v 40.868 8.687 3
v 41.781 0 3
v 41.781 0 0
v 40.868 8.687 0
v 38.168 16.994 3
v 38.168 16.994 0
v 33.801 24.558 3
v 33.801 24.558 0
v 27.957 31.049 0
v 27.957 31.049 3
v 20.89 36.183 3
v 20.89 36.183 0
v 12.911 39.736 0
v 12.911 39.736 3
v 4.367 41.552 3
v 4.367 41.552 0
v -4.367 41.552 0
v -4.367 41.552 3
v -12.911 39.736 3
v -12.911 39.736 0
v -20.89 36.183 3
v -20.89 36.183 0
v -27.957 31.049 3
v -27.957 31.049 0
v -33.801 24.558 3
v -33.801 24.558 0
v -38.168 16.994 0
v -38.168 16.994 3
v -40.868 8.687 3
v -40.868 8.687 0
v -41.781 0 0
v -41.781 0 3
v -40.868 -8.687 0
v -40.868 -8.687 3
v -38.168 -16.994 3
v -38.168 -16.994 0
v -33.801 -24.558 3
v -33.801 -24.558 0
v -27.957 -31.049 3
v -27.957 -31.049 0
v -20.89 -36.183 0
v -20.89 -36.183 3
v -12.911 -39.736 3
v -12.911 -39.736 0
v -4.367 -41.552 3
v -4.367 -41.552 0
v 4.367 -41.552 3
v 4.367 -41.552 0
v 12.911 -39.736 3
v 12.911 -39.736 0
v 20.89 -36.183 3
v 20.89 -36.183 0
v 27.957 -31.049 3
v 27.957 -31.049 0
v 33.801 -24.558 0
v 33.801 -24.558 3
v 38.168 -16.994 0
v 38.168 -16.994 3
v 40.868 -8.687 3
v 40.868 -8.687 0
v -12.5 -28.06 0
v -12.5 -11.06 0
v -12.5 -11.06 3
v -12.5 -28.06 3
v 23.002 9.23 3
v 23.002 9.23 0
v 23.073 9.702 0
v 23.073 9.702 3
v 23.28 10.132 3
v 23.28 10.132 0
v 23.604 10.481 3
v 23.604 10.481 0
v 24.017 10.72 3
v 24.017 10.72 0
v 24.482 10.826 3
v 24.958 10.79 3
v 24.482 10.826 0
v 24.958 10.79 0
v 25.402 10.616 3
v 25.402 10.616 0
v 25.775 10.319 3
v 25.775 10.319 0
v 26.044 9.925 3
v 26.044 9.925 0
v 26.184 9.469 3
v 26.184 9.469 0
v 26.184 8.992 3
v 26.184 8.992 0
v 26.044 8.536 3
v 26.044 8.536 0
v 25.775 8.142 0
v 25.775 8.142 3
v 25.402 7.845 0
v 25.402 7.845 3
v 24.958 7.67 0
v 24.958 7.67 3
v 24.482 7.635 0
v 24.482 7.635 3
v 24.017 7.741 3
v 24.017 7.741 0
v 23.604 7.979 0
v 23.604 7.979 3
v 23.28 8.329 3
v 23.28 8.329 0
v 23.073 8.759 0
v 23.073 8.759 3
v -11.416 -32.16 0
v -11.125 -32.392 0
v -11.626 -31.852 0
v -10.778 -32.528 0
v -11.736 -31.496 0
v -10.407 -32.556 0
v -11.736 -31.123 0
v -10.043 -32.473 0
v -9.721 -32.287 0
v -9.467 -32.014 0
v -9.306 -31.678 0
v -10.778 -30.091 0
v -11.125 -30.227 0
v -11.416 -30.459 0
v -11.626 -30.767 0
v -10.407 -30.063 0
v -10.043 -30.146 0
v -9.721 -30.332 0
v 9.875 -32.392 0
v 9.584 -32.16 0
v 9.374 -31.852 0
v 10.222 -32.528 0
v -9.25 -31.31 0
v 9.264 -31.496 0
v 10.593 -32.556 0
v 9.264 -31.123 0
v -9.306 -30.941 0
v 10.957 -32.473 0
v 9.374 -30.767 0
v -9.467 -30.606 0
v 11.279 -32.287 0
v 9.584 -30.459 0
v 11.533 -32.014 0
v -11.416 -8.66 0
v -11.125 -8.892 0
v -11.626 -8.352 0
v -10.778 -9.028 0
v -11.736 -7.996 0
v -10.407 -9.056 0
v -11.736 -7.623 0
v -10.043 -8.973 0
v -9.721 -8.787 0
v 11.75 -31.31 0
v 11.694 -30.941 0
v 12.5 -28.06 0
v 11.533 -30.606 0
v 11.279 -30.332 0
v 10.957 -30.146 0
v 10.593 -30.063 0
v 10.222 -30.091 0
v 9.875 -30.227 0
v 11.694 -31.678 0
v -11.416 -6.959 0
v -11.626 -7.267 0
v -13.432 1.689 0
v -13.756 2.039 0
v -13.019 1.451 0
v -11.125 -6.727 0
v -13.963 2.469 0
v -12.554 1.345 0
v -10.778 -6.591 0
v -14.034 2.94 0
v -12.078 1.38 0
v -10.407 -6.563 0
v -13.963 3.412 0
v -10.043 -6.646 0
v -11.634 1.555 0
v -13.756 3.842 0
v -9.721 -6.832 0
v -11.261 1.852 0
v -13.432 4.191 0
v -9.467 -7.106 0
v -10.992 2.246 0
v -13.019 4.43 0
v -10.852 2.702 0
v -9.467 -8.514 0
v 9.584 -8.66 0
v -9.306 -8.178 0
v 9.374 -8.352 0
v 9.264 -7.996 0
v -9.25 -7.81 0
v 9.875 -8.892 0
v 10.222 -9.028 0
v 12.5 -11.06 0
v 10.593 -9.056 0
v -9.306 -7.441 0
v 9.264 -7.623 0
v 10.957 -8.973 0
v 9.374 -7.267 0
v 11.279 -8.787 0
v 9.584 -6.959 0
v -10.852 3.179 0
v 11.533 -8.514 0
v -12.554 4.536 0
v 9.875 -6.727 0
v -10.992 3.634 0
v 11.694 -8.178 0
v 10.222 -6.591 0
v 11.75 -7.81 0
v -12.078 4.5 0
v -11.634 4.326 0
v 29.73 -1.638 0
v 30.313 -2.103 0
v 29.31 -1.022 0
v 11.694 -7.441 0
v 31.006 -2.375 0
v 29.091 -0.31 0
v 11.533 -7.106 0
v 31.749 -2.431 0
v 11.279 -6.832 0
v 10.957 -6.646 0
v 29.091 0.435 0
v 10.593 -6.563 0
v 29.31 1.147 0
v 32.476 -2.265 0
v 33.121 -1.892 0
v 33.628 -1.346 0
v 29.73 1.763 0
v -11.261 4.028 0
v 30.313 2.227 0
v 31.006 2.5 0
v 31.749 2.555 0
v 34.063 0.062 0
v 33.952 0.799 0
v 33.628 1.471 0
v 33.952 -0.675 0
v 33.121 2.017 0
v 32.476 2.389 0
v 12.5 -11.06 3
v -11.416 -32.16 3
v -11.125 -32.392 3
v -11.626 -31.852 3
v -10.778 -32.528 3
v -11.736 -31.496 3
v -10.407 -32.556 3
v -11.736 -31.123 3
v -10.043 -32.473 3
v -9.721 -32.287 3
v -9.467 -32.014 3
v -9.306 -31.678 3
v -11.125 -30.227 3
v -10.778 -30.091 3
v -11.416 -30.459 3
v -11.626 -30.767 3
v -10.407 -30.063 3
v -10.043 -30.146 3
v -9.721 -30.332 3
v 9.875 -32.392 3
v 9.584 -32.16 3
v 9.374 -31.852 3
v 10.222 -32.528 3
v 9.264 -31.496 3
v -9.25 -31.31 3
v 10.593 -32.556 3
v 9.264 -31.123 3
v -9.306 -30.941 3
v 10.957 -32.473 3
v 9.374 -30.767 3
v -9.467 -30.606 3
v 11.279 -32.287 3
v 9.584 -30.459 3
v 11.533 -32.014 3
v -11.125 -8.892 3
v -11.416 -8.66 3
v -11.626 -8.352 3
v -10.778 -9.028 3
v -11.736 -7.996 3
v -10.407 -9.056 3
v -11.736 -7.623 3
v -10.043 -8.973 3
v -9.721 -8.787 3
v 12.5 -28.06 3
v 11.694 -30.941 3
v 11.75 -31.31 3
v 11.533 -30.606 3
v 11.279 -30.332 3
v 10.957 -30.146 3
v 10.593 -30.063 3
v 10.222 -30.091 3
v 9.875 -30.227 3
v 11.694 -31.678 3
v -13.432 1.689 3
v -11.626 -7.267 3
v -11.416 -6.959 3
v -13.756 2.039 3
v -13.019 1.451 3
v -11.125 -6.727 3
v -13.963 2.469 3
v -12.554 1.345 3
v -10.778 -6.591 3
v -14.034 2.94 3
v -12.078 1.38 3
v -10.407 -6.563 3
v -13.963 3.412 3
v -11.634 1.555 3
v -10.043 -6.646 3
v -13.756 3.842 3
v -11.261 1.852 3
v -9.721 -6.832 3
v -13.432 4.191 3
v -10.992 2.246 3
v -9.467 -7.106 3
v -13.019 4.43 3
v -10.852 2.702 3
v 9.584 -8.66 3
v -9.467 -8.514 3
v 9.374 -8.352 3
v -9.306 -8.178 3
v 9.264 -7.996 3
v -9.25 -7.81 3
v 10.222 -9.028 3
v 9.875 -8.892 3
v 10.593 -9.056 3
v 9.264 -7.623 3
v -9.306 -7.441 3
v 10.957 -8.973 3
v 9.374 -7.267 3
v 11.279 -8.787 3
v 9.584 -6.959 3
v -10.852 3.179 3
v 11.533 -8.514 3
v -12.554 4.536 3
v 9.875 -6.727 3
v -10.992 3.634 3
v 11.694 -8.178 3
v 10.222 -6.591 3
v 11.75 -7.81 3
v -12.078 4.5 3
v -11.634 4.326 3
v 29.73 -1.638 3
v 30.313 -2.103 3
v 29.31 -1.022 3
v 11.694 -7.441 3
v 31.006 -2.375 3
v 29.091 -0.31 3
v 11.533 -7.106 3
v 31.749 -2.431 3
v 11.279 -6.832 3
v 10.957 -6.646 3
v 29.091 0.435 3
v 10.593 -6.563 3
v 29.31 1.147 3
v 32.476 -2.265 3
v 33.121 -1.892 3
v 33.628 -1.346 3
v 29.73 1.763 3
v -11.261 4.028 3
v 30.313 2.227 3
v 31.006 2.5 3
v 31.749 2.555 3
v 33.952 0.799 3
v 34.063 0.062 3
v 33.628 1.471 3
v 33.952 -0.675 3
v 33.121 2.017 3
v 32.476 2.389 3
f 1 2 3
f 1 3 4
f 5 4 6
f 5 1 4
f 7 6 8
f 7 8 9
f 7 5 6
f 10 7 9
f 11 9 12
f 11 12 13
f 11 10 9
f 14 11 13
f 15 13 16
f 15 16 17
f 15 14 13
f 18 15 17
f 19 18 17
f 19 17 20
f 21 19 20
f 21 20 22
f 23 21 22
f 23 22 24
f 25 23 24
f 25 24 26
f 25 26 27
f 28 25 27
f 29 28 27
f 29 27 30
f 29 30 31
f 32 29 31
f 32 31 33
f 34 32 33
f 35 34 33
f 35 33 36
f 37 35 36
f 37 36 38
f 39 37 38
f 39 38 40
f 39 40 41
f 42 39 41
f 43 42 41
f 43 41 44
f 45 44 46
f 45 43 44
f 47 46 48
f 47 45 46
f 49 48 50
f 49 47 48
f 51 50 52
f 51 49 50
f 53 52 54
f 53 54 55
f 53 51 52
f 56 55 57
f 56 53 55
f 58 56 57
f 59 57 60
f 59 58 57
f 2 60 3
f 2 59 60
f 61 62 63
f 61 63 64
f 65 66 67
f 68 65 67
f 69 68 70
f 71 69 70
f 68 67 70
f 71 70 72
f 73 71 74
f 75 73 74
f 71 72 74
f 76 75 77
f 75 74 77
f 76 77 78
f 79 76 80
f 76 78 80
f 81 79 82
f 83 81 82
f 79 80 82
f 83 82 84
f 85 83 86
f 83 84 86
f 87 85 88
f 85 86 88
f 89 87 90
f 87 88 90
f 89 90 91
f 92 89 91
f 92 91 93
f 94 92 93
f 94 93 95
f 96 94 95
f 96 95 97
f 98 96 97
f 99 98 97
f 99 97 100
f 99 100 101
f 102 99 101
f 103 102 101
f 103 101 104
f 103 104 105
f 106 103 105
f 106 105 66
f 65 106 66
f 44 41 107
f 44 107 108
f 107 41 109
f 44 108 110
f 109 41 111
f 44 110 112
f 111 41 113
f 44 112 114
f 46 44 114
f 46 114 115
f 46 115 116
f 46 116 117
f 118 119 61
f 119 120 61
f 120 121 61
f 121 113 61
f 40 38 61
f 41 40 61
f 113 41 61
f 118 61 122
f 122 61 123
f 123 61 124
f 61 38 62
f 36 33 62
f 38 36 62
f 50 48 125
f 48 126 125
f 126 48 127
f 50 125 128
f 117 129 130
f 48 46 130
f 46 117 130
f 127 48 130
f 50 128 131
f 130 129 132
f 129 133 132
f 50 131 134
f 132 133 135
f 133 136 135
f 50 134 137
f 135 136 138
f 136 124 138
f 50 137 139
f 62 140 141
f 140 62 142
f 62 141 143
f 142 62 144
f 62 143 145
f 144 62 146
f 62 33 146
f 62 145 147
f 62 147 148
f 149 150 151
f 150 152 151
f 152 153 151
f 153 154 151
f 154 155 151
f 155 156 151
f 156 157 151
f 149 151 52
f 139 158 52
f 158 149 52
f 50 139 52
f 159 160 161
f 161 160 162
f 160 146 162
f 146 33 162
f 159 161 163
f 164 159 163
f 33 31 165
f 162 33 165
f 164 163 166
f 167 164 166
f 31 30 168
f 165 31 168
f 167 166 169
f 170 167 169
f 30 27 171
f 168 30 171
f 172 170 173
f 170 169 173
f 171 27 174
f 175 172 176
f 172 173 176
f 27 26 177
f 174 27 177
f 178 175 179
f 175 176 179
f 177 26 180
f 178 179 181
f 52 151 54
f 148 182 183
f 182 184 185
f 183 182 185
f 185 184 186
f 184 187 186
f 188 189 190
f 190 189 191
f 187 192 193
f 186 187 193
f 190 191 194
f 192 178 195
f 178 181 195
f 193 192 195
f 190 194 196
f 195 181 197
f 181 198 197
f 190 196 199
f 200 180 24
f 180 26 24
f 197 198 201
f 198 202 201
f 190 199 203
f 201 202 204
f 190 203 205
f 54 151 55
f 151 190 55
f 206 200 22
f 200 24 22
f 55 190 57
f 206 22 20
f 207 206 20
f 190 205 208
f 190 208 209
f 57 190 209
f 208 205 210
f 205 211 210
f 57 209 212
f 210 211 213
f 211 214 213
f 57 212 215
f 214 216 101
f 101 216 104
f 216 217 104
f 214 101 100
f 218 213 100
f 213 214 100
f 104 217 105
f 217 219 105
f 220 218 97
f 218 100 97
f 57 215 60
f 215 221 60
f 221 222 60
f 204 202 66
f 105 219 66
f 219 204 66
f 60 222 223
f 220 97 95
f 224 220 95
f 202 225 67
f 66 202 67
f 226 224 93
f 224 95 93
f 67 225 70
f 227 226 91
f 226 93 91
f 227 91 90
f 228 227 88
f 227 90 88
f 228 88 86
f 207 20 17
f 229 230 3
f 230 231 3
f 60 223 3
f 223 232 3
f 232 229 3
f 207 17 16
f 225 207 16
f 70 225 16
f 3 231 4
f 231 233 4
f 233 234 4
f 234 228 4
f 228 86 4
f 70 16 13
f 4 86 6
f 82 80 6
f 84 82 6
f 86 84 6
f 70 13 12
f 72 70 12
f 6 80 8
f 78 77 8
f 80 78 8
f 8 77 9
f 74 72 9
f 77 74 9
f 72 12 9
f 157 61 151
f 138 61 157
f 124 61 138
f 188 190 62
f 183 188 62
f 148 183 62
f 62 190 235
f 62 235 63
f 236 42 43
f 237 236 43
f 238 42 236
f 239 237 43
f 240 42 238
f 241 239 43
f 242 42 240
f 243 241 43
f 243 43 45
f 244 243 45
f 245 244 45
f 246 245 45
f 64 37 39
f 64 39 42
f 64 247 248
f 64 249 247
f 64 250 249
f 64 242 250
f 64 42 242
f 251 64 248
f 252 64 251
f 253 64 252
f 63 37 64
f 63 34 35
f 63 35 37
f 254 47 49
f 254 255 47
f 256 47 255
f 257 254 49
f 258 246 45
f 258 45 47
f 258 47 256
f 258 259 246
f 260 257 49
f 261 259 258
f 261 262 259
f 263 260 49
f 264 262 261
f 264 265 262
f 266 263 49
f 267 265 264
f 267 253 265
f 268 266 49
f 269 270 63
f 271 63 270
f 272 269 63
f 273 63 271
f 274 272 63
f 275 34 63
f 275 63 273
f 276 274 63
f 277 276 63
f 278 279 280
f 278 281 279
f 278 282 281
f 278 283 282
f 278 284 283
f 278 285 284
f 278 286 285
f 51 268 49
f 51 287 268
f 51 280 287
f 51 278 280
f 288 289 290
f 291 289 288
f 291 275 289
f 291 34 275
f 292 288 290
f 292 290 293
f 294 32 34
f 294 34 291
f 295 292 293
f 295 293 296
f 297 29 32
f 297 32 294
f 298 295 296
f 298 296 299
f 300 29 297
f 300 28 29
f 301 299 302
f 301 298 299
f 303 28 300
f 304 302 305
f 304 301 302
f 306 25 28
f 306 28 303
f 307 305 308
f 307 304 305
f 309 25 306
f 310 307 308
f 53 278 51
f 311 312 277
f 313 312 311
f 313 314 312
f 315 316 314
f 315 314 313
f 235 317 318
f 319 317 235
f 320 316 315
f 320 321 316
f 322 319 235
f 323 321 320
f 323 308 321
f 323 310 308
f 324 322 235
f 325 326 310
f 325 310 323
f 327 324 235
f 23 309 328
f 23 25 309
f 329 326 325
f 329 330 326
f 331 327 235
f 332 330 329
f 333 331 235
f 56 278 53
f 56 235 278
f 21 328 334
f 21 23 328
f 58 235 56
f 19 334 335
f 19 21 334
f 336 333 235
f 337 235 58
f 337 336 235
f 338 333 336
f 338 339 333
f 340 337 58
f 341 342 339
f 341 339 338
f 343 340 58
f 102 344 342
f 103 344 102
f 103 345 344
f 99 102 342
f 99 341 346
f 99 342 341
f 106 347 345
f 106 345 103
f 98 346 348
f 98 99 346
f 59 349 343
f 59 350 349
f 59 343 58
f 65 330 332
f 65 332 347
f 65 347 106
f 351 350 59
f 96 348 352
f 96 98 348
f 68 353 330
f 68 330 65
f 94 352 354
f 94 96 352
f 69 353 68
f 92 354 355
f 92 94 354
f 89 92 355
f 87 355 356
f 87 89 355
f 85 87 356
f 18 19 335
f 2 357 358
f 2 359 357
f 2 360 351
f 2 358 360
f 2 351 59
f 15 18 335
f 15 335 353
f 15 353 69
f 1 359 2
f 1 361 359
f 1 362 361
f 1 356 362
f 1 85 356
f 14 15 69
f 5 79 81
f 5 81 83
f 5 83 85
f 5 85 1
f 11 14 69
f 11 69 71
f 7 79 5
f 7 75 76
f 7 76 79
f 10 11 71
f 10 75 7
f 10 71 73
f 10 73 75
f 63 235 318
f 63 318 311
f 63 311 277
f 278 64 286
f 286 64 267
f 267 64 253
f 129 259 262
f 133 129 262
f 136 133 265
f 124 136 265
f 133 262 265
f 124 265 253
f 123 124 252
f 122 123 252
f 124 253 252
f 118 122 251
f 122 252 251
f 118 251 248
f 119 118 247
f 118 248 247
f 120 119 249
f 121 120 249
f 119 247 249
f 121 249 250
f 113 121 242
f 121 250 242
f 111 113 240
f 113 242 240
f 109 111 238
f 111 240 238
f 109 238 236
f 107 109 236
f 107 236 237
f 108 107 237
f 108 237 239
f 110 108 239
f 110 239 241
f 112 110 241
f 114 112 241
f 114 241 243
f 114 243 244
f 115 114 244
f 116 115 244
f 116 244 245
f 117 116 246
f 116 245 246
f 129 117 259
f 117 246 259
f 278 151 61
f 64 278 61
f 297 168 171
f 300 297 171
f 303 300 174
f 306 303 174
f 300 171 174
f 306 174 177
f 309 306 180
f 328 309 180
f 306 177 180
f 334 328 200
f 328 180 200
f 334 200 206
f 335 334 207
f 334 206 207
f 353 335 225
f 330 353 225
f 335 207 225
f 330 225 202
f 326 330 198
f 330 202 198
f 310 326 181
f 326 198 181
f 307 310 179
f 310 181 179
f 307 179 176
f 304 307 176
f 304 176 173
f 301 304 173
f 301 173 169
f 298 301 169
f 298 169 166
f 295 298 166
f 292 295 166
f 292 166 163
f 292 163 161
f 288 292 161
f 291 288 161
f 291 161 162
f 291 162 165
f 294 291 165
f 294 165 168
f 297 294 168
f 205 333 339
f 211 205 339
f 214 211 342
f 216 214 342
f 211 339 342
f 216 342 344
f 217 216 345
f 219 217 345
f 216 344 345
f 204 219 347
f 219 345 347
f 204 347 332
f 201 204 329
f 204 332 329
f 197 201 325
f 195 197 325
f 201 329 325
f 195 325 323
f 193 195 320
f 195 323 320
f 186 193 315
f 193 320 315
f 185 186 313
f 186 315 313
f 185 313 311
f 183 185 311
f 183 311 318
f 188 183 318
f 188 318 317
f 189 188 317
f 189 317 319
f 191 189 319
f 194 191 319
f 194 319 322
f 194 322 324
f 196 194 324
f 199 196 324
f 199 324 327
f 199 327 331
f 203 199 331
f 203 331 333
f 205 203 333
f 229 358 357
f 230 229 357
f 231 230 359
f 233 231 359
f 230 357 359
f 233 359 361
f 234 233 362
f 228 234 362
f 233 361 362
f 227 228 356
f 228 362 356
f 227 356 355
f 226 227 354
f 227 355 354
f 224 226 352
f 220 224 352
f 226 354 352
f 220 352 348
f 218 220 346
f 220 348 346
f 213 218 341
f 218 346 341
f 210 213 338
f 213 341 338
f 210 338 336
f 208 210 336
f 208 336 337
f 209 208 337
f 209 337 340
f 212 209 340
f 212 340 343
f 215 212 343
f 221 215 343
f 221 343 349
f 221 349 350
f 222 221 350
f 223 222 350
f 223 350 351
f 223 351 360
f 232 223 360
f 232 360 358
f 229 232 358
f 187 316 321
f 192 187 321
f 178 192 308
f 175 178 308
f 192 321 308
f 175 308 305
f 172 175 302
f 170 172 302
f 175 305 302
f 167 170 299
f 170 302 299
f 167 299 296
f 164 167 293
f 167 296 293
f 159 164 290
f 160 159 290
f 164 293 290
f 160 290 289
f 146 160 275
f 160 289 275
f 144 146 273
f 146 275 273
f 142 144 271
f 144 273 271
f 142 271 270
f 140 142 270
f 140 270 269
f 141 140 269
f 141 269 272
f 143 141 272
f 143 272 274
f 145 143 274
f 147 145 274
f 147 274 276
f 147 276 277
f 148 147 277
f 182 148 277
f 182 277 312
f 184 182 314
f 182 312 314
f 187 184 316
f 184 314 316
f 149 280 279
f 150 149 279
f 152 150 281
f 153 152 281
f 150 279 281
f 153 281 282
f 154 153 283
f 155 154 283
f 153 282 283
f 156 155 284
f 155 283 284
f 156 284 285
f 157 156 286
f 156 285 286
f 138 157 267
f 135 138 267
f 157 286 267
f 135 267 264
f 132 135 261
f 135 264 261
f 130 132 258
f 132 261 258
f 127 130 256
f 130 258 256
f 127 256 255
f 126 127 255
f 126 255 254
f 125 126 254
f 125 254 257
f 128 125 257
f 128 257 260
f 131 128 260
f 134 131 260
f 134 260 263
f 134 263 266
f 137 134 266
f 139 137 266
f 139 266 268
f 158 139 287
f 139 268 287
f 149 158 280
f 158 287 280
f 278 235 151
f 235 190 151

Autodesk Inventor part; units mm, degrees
ref_plane "YZ Plane" through (0, 0, 0) normal (1, 0, 0) x (0, 1, 0)
ref_plane "XZ Plane" through (0, 0, 0) normal (0, 1, 0) x (-1, 0, 0)
ref_plane "XY Plane" through (0, 0, 0) normal (0, 0, 1) x (1, 0, 0)
sketch "Эскиз3" plane through (0, 0, 0) normal (0, 0, 1) x (1, 0, 0)
  circle A0 centre (0, 0) radius 41.5
  line L0 (12.5, -11.0597) -> (-12.5, -11.0597) projected
  line L1 (-12.5, -11.0597) -> (-12.5, -28.0597) projected
  line L2 (-12.5, -11.0597) -> (12.5, -11.0597)
  line L3 (12.5, -11.0597) -> (12.5, -28.0597)
  line L4 (12.5, -28.0597) -> (-12.5, -28.0597)
  line L5 (-12.5, -28.0597) -> (-12.5, -11.0597)
  dimension "d9" = 83
  dimension "d10" = 25
  dimension "d11" = 17
  dimension "d13" = 25
  dimension "d14" = 17
  dimension "d15" = 12.5
extrude "Выдавливание3" add sketch "Эскиз3" along normal blind 3
sketch "Эскиз4" plane through (0, 0, 3) normal (0, 0, 1) x (1, 0, 0)
  arc A0 (5.7629, -8.6636) -> (-4.709, -8.7124) centre (0.4132, 15.7598) ccw
  circle A1 centre (0.4132, 15.7598) radius 1.5338
  point P0 (0, 0)
extrude "Выдавливание4" cut sketch "Эскиз4" against normal blind 3
sketch "Эскиз5" plane through (0, 0, 3) normal (0, 0, 1) x (1, 0, 0)
  line L0 (-51.8221, -46.0116) -> (-45.155, -49.3714) projected
  circle A0 centre (31.5626, 0.0623) radius 2.5
  point P0 (0, 0)
  dimension "d20" = 5
extrude "Выдавливание5" cut sketch "Эскиз5" against normal blind 3
sketch "Эскиз6" plane through (0, 0, 3) normal (0, 0, 1) x (1, 0, 0)
  circle A0 centre (0.4132, 15.7598) radius 1.5338 projected
  point P0 (0, 0)
extrude "Выдавливание6" add sketch "Эскиз6" against normal blind 3
sketch "Эскиз7" plane through (0, 0, 3) normal (0, 0, 1) x (1, 0, 0)
  circle A0 centre (10.5, -7.8097) radius 1.25 projected
  circle A1 centre (-10.5, -7.8097) radius 1.25 projected
  circle A2 centre (-10.5, -31.3097) radius 1.25 projected
  circle A3 centre (10.5, -31.3097) radius 1.25 projected
  point P0 (0, 0)
extrude "Выдавливание7" cut sketch "Эскиз7" against normal blind 3
sketch "Эскиз13" plane through (0, 0, 3) normal (0, 0, 1) x (1, 0, 0)
  circle A0 centre (0, 0) radius 41.5 projected
  circle A1 centre (0, 0) radius 41.7806
  point P0 (-26.934, 31.9403)
extrude "Выдавливание12" add sketch "Эскиз13" against normal blind 3
sketch "Эскиз14" plane through (0, 0, 0) normal (0, 0, -1) x (-1, 0, 0)
  circle A0 centre (-24.602, 9.2303) radius 1.6 projected
  circle A1 centre (12.434, 2.9402) radius 1.6 projected
  point P0 (0, 0)
extrude "Выдавливание13" cut sketch "Эскиз14" against normal blind 3
equation "\"d13\" = d10"
equation "\"d14\" = d11"
equation "\"d15\" = 0.5 * d13"
properties part number "top"
